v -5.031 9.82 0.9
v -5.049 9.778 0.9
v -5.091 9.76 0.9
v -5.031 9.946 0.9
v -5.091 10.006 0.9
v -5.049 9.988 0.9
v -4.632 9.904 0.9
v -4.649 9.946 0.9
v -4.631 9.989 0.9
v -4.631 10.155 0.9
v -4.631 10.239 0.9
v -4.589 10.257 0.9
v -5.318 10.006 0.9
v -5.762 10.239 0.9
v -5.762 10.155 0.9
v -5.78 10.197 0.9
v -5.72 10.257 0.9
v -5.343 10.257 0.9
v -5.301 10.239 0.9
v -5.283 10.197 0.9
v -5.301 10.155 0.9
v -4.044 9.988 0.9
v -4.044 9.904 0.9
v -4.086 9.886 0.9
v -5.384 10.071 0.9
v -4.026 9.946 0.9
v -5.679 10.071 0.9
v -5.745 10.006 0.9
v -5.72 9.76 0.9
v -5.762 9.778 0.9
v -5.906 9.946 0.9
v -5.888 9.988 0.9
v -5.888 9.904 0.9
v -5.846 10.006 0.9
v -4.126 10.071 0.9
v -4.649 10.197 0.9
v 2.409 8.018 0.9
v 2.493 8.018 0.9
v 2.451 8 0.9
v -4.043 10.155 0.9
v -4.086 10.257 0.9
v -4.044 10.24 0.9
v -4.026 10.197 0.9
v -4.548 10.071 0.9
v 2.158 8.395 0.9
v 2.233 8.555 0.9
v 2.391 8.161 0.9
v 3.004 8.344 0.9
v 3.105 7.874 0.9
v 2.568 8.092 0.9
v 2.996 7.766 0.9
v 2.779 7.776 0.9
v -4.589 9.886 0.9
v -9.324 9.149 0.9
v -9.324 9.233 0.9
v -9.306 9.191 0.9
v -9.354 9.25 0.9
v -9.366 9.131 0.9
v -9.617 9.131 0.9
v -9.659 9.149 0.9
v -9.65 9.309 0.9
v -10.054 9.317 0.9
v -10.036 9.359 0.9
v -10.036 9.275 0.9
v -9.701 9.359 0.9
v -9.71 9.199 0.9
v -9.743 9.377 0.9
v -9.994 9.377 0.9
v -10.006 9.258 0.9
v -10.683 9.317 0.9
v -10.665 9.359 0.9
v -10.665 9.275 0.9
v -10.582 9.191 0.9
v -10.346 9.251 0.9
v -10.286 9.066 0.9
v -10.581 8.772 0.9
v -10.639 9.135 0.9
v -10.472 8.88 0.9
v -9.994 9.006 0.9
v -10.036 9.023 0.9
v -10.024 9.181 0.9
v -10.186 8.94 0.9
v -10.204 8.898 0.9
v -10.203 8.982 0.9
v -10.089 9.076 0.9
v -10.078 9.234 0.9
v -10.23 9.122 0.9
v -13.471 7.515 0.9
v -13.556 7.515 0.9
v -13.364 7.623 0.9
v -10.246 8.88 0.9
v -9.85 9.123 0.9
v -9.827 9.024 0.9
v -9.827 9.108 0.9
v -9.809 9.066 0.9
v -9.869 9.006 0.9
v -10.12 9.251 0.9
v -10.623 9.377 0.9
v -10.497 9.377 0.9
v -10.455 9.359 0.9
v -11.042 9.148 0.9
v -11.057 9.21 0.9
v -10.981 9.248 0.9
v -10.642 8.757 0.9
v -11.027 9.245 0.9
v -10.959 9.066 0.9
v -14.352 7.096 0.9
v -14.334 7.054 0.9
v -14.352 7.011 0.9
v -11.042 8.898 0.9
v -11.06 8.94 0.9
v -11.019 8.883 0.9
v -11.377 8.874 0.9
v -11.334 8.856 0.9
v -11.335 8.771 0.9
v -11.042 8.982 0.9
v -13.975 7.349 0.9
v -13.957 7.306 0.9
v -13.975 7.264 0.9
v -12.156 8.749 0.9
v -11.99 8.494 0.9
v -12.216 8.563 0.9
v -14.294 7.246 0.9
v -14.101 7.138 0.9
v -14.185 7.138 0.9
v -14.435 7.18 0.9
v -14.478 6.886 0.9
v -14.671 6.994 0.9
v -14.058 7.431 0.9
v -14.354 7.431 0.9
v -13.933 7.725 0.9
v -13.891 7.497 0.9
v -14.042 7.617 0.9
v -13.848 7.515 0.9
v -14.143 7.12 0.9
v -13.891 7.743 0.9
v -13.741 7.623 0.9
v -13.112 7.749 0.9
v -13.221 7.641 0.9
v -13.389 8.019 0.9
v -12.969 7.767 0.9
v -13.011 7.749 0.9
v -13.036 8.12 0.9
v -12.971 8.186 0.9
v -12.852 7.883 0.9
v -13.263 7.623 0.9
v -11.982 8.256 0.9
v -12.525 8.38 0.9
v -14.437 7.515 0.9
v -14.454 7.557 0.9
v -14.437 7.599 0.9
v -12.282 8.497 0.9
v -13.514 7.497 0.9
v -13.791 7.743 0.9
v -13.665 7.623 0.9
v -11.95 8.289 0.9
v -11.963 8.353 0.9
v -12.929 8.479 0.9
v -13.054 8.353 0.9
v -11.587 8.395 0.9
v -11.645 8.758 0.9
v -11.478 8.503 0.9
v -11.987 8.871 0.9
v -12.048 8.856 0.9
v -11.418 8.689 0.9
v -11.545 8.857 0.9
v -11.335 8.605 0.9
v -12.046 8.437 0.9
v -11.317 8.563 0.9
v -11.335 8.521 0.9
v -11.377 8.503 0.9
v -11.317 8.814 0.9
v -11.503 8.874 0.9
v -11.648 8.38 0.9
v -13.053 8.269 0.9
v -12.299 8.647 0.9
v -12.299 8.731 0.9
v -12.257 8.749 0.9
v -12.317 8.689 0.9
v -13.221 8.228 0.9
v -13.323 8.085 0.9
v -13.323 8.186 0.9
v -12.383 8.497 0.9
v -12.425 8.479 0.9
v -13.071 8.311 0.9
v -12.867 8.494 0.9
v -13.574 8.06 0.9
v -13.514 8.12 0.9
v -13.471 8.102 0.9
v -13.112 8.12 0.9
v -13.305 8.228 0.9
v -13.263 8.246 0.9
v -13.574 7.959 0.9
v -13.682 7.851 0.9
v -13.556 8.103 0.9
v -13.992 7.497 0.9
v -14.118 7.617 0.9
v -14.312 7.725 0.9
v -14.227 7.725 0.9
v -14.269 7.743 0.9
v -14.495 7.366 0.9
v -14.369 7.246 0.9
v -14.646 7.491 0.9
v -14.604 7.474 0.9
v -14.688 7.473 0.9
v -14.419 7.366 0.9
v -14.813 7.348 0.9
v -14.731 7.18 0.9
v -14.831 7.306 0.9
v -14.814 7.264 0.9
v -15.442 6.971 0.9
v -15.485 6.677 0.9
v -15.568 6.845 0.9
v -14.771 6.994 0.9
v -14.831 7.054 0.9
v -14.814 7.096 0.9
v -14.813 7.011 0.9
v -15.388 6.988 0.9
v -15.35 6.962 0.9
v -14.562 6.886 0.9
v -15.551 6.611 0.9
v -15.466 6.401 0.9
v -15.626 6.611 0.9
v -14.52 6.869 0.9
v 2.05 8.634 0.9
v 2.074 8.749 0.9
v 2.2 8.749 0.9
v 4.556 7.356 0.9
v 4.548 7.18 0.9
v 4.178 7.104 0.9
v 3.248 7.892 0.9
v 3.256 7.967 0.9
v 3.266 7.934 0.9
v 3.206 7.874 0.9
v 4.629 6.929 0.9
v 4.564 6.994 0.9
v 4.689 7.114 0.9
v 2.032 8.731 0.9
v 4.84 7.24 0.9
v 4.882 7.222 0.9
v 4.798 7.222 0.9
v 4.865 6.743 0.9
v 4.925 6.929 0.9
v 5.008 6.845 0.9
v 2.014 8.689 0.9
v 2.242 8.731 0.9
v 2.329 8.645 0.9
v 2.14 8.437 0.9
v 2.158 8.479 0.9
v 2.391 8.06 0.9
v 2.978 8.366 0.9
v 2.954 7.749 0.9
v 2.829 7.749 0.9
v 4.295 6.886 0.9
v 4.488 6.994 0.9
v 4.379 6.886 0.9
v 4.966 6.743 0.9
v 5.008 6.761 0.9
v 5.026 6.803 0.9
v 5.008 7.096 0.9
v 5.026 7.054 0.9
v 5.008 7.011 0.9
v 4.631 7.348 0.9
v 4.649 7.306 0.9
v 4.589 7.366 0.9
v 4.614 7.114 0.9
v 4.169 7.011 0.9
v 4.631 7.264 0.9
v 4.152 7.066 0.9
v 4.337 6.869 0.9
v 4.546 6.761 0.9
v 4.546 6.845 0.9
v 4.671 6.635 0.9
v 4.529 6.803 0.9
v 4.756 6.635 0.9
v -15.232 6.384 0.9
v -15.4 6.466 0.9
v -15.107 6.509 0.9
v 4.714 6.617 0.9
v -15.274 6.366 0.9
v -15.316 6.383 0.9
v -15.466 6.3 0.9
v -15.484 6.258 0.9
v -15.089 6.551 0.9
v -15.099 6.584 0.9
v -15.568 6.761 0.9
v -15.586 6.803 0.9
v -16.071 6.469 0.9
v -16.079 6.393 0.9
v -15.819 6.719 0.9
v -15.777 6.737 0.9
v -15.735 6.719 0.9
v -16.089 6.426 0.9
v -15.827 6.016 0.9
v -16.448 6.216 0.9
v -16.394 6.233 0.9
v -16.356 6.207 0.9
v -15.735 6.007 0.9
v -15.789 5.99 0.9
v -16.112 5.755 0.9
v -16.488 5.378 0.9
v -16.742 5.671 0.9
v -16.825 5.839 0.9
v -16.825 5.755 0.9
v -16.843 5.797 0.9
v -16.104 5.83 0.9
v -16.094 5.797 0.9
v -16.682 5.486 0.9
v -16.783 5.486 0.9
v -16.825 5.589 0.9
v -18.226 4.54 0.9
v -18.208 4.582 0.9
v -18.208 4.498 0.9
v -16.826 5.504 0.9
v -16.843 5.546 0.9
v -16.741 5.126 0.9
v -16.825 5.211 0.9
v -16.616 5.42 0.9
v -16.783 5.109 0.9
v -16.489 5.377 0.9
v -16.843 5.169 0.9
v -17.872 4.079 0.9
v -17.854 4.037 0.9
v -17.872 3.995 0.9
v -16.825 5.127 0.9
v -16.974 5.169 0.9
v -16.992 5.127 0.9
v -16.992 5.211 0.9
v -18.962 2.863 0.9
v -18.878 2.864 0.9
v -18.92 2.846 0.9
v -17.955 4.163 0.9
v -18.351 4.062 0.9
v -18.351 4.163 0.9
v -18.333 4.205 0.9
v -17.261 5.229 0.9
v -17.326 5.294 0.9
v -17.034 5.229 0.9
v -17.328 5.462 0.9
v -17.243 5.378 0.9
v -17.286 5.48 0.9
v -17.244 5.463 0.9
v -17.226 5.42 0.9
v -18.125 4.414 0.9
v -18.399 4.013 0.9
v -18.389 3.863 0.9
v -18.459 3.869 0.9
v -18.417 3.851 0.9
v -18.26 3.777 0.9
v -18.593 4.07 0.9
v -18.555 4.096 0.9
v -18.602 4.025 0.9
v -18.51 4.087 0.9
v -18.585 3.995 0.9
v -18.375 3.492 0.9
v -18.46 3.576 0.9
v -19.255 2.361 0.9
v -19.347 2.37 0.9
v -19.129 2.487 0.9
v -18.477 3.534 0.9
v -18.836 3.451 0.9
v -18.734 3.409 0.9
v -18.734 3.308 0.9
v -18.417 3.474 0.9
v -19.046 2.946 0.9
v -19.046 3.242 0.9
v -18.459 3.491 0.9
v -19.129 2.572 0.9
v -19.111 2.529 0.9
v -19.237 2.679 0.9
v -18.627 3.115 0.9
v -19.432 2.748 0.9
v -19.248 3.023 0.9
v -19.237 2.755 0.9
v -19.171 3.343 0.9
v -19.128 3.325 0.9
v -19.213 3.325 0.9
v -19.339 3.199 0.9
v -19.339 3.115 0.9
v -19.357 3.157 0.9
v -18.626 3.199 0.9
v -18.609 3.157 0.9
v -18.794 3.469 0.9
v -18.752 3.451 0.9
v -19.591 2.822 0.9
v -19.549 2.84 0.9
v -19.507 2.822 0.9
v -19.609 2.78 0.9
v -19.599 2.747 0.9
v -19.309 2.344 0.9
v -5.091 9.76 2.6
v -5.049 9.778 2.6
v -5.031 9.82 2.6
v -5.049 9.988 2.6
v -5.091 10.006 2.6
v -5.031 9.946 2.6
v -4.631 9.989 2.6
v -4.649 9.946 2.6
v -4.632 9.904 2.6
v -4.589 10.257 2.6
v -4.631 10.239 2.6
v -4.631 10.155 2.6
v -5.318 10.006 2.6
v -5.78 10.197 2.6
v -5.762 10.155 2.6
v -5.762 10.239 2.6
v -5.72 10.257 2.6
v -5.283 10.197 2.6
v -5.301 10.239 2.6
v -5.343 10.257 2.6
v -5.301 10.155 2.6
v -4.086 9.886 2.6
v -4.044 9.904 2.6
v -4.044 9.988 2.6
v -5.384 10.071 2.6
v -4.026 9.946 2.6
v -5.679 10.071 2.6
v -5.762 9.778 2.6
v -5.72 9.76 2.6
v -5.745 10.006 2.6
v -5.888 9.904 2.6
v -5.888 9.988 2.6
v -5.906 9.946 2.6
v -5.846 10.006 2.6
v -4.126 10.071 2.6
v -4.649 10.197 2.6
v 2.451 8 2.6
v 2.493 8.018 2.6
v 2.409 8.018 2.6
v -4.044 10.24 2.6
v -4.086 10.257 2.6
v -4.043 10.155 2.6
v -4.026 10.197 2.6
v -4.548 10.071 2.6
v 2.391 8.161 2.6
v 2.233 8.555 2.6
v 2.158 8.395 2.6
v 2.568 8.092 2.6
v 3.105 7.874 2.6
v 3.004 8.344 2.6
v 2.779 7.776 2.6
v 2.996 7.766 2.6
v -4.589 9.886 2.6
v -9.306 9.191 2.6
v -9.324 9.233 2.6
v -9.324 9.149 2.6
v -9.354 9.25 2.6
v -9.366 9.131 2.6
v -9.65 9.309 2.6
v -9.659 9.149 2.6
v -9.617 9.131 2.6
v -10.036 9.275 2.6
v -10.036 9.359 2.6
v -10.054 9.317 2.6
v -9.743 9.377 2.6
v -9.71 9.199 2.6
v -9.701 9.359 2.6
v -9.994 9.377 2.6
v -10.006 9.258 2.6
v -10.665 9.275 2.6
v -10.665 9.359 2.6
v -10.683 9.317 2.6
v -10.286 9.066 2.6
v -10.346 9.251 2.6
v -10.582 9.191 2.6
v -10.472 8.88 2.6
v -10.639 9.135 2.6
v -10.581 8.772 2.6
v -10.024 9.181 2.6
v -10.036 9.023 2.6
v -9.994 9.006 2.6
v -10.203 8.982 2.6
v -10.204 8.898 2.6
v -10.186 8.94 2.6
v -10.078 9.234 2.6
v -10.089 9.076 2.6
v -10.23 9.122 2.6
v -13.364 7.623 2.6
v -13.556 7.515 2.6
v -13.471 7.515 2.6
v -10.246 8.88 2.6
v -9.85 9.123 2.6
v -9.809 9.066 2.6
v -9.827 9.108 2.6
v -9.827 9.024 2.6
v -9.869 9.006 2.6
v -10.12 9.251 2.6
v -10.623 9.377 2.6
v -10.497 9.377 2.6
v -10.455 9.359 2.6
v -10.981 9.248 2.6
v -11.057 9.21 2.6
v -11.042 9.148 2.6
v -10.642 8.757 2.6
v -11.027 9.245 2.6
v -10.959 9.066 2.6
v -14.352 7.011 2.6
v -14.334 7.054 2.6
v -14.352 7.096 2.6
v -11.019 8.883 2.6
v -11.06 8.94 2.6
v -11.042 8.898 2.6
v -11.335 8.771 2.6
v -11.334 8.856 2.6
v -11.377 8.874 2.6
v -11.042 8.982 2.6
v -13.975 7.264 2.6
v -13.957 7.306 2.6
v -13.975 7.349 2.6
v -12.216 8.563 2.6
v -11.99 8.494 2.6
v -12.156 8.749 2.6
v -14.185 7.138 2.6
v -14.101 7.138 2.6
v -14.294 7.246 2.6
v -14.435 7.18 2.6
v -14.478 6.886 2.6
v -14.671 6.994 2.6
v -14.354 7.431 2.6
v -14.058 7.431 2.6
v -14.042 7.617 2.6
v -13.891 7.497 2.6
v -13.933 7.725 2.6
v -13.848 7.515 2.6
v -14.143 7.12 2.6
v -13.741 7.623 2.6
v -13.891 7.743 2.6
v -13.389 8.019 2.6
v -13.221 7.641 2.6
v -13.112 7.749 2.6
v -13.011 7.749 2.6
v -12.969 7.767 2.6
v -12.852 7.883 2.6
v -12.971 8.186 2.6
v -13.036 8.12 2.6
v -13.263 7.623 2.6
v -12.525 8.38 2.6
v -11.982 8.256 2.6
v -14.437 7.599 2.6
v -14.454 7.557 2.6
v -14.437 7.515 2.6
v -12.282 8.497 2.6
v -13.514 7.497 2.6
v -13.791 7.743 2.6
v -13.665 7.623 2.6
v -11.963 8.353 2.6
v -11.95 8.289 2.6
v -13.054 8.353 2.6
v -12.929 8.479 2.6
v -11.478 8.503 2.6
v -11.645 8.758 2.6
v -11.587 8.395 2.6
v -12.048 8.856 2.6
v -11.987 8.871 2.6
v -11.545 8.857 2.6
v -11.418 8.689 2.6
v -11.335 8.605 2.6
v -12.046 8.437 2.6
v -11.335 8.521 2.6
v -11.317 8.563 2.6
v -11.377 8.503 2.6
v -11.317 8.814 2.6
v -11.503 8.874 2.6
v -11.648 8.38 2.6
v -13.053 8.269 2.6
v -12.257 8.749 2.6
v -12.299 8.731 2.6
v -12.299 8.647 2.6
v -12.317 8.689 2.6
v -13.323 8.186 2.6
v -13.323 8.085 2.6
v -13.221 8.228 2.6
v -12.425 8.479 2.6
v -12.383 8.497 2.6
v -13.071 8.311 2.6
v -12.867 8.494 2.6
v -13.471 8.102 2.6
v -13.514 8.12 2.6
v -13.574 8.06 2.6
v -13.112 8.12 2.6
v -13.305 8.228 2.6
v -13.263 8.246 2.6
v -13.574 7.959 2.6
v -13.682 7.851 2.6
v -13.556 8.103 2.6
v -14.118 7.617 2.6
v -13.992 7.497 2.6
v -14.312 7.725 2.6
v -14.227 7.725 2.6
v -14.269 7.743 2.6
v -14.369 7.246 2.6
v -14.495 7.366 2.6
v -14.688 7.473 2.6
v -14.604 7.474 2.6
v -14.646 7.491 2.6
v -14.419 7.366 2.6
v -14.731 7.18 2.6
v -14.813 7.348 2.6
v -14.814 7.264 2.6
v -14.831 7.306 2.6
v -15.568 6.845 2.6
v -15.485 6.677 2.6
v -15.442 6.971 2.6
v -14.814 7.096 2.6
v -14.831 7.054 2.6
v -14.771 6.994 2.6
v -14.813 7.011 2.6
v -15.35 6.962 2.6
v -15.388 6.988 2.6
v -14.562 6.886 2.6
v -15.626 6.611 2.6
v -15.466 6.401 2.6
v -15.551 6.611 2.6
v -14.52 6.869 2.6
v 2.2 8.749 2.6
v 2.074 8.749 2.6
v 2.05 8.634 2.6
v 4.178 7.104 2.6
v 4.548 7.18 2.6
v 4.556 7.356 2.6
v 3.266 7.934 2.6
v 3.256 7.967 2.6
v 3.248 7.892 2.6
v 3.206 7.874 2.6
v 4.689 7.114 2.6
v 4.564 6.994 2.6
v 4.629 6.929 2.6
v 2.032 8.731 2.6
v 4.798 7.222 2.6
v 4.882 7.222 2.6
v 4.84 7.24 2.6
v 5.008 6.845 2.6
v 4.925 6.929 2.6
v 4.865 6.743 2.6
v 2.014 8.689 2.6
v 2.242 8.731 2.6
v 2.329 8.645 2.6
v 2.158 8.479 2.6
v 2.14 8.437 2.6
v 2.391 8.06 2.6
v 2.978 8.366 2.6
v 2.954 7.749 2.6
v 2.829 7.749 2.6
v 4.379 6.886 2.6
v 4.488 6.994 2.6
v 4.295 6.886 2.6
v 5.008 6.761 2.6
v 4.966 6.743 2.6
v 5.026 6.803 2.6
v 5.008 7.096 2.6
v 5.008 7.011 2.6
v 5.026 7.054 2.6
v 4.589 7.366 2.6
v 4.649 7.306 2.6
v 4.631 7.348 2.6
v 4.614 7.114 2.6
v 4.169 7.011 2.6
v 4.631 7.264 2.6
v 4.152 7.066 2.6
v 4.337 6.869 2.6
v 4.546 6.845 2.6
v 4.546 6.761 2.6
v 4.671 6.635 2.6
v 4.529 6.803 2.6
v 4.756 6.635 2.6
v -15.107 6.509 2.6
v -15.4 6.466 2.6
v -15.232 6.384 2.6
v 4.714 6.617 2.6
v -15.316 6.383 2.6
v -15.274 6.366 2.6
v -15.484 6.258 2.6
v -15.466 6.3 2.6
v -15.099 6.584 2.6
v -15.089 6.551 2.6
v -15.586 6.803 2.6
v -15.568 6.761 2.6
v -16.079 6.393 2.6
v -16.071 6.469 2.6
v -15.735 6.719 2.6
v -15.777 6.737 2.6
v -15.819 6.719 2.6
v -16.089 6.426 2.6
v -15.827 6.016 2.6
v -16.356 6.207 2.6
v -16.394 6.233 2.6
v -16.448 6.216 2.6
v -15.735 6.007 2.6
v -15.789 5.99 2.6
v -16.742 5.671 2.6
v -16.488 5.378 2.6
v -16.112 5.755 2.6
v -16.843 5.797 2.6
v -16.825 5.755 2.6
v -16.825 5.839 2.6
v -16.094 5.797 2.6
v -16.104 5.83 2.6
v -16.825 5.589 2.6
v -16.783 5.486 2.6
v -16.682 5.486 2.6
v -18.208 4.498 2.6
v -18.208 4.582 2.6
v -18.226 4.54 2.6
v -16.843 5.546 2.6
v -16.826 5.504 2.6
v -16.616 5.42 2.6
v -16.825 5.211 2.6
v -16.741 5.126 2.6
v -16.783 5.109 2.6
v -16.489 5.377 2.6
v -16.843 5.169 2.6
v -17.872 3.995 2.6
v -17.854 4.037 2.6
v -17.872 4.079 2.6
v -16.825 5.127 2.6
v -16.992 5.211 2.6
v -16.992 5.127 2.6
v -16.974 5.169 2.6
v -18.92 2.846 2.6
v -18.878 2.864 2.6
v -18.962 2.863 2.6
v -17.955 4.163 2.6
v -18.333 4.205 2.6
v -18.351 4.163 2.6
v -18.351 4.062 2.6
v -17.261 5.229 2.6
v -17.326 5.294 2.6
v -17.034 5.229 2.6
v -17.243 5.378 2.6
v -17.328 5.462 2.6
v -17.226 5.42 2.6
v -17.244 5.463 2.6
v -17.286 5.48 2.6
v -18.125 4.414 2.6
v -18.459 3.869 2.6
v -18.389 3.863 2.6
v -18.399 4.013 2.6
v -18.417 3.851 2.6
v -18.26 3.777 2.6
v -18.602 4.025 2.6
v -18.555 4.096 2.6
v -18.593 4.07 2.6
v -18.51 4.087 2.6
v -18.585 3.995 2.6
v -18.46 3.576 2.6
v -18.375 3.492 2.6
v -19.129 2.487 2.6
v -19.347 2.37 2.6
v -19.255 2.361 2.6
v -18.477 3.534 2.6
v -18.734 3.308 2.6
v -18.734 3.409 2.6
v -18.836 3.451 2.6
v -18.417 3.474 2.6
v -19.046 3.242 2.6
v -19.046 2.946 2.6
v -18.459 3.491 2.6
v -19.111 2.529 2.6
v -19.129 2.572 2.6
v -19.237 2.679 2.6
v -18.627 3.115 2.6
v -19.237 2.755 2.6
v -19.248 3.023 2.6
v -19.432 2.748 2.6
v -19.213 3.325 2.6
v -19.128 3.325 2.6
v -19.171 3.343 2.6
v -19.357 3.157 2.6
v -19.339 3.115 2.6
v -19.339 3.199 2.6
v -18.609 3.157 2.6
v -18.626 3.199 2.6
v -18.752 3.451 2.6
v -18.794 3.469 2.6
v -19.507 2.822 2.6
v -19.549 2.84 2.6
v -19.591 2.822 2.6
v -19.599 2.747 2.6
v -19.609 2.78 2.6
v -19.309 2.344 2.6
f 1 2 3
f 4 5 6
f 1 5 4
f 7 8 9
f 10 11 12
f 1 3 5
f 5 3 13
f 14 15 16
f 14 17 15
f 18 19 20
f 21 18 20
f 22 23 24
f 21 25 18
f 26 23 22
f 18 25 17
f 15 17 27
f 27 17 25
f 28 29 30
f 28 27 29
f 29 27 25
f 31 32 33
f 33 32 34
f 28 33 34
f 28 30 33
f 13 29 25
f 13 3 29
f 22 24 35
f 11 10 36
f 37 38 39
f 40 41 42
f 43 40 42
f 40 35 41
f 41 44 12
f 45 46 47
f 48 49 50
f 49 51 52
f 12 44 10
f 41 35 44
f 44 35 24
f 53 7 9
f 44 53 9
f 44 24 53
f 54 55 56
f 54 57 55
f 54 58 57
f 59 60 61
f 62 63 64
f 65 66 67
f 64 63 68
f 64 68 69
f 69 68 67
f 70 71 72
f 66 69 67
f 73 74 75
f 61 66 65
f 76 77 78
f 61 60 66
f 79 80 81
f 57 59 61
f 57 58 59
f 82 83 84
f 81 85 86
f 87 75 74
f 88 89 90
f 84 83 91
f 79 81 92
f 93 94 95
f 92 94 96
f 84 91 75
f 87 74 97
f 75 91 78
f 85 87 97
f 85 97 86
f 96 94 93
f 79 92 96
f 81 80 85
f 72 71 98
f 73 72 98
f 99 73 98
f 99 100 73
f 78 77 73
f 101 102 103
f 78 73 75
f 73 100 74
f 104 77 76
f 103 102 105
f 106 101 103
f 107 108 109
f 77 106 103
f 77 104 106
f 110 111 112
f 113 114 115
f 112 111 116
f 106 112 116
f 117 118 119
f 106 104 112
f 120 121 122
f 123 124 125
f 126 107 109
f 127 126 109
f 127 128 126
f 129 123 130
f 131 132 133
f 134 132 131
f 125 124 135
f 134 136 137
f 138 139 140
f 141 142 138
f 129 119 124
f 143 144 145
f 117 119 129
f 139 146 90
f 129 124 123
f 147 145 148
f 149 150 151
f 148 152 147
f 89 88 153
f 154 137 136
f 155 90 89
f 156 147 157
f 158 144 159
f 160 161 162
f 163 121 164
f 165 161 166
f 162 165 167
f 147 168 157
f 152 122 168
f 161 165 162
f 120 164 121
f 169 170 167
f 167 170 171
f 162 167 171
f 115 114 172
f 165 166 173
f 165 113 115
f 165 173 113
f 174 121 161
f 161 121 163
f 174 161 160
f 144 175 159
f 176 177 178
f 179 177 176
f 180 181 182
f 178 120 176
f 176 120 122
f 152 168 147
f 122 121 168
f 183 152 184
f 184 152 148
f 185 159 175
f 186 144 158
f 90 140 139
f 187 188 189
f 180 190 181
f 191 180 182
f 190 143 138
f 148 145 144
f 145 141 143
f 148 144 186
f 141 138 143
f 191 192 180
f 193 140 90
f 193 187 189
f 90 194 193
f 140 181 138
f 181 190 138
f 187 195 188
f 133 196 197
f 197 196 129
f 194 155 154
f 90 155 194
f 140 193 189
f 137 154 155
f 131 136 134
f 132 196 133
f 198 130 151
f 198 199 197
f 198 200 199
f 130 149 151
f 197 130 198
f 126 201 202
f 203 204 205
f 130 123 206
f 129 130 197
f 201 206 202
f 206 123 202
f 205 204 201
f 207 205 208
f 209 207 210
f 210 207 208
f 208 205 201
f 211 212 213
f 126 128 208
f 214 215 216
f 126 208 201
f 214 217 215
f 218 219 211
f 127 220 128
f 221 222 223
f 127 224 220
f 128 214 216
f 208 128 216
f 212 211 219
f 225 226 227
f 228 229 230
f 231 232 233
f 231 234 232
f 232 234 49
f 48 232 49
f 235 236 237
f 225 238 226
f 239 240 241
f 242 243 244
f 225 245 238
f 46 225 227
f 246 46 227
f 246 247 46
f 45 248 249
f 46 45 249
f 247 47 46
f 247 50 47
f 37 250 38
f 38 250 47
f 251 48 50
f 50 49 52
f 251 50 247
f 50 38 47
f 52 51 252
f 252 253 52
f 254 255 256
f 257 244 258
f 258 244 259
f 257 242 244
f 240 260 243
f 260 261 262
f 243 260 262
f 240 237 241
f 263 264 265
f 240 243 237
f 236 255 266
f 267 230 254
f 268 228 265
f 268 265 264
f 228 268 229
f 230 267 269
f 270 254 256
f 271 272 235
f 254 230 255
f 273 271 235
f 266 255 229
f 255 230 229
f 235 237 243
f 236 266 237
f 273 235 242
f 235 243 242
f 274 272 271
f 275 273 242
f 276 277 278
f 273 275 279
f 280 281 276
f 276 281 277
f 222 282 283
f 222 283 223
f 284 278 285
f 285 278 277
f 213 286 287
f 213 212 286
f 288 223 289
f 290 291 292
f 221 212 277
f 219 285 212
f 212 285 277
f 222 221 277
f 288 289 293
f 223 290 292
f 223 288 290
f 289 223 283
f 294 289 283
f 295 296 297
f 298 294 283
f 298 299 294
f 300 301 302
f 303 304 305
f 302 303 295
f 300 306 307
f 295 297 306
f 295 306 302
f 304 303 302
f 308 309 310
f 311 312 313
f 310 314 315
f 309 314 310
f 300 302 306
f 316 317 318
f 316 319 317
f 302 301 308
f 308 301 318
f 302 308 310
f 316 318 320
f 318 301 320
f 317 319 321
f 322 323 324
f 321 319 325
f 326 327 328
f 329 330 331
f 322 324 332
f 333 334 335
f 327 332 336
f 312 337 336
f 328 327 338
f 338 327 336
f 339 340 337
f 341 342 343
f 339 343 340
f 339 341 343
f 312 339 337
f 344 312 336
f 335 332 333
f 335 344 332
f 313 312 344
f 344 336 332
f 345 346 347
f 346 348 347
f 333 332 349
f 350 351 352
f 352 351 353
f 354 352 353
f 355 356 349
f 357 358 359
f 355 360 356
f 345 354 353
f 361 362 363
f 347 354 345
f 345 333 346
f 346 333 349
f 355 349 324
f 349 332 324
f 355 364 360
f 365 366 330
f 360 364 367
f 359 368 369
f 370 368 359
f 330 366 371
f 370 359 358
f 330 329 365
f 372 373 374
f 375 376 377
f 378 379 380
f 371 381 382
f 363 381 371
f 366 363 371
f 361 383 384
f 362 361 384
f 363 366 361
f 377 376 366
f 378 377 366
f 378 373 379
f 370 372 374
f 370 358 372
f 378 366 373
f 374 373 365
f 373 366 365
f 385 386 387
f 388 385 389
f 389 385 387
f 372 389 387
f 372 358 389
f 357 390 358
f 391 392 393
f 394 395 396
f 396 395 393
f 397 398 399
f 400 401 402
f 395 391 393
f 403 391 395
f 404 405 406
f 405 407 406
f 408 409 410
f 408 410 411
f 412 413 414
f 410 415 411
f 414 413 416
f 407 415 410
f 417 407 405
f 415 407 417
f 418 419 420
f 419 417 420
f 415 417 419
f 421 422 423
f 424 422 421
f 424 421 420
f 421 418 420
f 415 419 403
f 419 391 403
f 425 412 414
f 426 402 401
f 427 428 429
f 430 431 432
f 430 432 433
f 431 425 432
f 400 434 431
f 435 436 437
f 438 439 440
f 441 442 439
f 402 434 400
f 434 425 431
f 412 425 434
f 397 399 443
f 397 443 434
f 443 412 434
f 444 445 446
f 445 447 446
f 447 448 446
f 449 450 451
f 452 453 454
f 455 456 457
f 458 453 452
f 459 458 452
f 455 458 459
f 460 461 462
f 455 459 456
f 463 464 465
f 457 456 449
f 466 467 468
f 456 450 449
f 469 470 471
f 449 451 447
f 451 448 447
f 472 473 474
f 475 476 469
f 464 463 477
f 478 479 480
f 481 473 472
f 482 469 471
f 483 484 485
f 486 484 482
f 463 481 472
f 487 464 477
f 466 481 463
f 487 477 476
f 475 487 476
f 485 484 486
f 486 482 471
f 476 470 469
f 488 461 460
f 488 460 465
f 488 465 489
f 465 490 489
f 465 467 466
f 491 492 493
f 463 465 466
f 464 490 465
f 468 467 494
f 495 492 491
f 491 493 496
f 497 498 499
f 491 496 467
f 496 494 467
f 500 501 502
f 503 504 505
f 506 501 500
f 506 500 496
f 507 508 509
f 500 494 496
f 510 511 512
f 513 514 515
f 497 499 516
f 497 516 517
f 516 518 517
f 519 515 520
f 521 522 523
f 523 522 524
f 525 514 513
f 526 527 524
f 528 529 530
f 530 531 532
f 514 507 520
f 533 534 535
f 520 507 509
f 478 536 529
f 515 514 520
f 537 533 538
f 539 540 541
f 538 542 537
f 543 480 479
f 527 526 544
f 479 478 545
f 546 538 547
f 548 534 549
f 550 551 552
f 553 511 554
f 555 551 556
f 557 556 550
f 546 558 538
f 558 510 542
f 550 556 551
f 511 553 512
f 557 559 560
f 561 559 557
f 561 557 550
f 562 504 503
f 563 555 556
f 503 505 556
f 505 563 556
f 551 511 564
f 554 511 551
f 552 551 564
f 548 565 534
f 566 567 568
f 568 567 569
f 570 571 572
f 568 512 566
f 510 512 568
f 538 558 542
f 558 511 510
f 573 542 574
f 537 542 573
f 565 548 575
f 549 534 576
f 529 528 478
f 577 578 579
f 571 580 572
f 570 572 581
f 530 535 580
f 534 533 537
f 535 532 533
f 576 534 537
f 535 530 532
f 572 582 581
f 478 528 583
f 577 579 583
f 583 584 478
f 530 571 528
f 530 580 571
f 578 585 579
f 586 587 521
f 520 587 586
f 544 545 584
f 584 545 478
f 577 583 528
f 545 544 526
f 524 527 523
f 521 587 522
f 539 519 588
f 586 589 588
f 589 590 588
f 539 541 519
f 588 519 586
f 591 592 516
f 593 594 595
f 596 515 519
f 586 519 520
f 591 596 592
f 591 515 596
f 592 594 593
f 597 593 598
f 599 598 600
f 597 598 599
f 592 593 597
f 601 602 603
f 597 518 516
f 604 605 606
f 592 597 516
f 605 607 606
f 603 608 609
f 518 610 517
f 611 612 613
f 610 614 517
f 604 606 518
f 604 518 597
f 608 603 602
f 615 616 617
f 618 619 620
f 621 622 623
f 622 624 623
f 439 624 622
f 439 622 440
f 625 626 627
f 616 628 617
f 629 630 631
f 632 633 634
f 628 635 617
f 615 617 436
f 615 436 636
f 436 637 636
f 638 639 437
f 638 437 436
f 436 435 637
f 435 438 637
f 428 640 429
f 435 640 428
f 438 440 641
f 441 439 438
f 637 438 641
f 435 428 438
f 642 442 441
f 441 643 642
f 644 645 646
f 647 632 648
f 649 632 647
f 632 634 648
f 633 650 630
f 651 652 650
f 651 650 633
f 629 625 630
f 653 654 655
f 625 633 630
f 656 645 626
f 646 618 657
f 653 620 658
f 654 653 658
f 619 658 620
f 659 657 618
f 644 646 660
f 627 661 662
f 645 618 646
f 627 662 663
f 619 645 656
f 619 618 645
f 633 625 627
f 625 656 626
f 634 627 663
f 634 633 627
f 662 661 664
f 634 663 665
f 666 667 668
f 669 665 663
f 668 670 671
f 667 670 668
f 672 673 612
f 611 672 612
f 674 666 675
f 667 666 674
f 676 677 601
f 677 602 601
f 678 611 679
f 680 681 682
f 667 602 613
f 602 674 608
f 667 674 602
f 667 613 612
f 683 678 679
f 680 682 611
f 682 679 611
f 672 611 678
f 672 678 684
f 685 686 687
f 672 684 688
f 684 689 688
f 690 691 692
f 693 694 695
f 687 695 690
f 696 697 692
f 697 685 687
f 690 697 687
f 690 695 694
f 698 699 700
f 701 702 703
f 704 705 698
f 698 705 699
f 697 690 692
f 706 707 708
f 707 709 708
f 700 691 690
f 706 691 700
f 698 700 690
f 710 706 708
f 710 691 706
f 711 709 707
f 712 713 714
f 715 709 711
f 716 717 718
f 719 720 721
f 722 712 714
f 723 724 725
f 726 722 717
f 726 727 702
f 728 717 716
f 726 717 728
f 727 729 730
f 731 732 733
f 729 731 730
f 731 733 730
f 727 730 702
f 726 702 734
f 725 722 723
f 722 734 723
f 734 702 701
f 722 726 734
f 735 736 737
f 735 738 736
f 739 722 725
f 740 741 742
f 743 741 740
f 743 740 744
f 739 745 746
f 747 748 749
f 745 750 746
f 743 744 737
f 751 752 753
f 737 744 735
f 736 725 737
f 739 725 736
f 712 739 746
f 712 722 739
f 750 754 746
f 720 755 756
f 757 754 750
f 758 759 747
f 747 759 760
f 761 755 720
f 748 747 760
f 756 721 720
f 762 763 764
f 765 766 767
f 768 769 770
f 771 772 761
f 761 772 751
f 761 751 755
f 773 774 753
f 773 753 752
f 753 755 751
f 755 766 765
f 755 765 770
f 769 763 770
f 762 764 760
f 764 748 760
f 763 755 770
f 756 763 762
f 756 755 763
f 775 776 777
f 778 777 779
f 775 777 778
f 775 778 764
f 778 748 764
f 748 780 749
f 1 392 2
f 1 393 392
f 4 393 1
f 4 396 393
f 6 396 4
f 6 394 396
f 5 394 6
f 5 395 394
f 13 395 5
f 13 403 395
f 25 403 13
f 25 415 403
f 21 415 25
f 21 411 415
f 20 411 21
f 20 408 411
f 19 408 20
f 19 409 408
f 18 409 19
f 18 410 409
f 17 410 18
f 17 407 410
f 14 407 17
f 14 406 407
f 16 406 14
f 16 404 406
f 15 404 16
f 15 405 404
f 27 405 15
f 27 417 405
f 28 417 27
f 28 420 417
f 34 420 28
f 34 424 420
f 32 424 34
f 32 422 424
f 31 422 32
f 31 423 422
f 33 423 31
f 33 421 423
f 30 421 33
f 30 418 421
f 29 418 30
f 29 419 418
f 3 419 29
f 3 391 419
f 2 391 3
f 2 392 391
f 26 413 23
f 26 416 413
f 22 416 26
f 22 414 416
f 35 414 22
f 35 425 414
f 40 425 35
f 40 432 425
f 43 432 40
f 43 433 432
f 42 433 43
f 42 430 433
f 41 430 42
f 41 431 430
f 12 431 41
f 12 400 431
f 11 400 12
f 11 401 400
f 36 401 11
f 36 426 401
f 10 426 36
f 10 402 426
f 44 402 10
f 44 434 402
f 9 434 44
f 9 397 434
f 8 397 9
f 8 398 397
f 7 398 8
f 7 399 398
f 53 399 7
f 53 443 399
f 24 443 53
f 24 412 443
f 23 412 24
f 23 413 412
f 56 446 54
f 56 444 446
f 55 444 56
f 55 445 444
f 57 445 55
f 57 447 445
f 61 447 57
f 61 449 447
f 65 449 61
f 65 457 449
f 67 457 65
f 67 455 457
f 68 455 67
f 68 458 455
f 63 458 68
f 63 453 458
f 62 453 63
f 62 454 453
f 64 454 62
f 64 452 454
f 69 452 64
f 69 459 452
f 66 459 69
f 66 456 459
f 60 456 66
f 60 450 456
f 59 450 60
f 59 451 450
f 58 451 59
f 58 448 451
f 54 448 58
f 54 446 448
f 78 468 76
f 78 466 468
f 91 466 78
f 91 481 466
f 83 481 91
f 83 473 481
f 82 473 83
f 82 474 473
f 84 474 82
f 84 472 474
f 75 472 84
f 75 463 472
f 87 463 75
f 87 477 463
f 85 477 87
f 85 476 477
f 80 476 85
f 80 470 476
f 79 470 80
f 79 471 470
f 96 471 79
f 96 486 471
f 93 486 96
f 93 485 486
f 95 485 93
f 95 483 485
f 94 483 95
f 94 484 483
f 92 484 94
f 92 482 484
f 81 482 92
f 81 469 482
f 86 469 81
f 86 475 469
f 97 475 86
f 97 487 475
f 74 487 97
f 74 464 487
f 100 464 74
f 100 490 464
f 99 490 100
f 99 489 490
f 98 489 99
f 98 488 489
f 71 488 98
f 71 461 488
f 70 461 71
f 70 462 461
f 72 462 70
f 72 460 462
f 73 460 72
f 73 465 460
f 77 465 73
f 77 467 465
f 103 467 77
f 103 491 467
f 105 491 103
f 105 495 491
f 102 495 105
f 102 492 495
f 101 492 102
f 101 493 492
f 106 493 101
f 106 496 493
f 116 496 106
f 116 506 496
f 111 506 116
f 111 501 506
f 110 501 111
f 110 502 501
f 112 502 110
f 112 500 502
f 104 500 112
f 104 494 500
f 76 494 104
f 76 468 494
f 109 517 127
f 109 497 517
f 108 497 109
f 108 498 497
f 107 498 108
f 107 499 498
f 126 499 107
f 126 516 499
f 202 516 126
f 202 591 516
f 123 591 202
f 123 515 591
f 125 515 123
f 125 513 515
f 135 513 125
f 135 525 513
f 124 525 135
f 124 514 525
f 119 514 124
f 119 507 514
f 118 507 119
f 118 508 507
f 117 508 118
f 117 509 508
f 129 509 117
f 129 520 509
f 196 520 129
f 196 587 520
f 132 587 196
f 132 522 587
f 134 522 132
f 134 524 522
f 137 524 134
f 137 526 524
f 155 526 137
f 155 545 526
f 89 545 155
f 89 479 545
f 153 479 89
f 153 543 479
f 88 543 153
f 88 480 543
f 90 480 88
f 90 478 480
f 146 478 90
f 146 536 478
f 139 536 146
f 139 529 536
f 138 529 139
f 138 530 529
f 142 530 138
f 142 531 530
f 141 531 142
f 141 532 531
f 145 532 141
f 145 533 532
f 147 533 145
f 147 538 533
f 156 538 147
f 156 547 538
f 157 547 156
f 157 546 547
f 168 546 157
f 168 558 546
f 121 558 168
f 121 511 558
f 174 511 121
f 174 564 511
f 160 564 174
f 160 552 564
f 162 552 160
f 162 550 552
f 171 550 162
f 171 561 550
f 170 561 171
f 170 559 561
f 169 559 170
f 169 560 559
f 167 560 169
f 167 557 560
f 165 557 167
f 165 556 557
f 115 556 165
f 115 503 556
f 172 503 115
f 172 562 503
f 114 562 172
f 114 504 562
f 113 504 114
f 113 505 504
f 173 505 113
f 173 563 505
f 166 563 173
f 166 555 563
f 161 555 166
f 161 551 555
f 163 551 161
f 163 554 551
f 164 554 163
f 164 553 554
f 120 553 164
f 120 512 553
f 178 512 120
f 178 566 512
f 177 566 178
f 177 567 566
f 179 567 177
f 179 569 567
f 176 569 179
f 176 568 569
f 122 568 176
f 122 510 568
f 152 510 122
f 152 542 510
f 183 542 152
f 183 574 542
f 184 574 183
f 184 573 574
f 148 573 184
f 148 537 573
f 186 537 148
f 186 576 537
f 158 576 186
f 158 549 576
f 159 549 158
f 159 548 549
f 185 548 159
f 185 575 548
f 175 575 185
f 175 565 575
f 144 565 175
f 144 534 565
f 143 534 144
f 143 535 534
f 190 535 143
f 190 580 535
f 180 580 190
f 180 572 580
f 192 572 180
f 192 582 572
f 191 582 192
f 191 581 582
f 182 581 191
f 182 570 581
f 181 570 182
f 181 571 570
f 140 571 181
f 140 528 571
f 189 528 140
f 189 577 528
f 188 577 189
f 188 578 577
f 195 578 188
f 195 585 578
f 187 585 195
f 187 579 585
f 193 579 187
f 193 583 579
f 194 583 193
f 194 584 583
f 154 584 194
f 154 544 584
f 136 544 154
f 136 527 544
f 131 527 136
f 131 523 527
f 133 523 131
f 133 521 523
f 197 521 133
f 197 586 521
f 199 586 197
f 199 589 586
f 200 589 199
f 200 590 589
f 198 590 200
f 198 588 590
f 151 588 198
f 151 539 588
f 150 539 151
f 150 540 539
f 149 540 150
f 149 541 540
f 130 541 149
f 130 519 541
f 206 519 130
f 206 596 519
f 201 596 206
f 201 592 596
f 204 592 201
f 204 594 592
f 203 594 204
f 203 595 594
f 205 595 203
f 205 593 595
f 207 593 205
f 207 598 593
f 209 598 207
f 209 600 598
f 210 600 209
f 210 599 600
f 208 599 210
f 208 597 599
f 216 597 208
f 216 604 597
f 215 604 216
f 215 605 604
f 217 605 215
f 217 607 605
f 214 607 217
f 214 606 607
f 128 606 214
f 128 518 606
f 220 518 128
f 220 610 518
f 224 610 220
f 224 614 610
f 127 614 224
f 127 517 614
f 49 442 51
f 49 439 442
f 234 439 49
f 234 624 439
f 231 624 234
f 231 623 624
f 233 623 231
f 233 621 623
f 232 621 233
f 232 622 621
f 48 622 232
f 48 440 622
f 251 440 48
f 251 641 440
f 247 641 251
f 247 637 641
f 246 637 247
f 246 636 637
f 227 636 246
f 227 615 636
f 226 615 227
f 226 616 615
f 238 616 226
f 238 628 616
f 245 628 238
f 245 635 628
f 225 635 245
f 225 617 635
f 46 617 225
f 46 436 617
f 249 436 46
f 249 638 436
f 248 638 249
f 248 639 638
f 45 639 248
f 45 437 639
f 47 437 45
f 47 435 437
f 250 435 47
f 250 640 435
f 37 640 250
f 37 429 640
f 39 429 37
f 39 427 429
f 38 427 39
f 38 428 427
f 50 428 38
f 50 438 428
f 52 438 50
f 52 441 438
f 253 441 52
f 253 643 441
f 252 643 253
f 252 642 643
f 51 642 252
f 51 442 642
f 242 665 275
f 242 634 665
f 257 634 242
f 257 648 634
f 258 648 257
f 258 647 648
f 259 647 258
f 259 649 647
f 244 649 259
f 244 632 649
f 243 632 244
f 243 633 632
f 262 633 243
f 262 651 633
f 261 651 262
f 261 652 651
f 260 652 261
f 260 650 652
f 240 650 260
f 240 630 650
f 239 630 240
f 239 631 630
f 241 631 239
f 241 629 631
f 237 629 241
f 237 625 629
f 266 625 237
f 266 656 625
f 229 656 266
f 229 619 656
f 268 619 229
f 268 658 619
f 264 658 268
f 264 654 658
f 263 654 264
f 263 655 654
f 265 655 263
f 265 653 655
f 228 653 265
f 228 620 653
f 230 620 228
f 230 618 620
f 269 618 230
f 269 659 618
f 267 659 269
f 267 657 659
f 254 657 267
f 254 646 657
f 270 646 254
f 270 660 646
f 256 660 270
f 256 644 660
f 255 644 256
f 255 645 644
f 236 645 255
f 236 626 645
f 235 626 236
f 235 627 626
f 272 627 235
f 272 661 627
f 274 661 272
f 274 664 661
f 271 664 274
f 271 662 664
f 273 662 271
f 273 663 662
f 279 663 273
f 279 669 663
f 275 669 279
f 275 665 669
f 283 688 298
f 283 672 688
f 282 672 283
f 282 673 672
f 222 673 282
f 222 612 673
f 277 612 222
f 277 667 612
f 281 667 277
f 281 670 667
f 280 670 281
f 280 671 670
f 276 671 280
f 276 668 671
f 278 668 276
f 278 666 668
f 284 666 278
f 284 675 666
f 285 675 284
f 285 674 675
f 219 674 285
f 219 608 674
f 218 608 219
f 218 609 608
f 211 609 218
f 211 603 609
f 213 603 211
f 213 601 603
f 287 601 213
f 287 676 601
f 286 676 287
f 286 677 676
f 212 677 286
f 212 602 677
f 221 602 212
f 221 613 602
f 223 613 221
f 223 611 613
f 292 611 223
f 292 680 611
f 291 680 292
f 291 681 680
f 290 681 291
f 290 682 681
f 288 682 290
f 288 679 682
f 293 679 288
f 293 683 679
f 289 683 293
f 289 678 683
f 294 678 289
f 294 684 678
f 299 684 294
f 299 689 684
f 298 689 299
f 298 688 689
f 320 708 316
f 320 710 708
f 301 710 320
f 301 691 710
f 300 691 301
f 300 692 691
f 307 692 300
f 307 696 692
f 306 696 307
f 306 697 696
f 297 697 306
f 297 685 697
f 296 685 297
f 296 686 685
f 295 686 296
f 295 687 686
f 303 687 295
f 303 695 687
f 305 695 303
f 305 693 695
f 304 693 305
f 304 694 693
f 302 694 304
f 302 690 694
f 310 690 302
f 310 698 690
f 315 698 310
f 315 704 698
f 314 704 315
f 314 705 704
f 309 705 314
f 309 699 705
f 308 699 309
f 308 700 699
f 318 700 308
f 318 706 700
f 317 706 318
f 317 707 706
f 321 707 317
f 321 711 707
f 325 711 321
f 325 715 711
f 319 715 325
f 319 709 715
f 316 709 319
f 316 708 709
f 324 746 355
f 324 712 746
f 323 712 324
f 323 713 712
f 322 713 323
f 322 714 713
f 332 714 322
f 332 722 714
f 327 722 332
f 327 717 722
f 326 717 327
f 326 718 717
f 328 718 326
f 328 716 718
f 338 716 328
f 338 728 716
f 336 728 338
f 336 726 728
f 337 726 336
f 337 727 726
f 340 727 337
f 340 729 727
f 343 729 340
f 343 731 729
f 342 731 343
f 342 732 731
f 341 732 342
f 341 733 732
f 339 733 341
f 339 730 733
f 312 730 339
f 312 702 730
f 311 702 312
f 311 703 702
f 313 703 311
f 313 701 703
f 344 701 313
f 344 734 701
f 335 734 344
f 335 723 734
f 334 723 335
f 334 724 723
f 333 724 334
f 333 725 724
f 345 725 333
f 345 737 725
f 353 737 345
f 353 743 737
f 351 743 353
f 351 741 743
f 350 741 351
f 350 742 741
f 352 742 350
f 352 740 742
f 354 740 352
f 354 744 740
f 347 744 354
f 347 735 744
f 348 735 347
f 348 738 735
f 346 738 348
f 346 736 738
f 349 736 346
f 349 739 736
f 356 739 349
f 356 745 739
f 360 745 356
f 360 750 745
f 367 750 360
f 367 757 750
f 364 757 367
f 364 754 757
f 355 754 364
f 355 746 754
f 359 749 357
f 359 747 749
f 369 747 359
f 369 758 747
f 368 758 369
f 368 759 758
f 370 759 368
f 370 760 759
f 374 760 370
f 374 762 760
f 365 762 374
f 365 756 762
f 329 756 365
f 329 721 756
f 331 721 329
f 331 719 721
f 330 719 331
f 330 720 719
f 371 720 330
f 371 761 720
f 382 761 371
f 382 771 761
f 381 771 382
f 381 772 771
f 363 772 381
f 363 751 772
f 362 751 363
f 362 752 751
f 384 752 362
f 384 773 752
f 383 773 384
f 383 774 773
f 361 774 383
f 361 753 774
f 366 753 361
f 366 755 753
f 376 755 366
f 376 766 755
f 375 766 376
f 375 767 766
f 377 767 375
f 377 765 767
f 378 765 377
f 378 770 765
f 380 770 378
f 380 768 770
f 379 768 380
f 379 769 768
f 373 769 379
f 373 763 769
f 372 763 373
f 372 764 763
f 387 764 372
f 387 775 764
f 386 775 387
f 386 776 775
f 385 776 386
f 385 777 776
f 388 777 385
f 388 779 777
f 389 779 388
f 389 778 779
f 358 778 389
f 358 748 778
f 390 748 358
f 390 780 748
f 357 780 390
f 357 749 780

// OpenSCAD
$fn = 24;
translate([0, -2.500, 0.900])
  linear_extrude(height=1.700) {
offset(r=0.06, $fn=8) {
    polygon(points=[[-18.794,5.909],[-19.046,5.657],[-19.171,5.783],[-19.297,5.657],[-19.171,5.531],[-19.423,5.154],[-19.549,5.280],[-19.674,5.154],[-19.549,5.280],[-19.297,4.903],[-19.171,5.029],[-19.297,5.154],[-19.297,5.280],[-19.046,5.531],[-18.920,5.406],[-18.669,5.657],[-18.794,5.783]], paths=[[0,1,2,3,4,5,6,7,8,9,10,11,12,13,14,15,16]]);
    polygon(points=[[-17.034,7.669],[-17.286,7.669],[-17.411,7.794],[-17.286,7.920],[-18.166,7.040],[-18.040,6.914],[-18.291,6.663],[-18.291,6.537],[-18.417,6.411],[-18.543,6.537],[-18.920,6.160],[-18.543,6.537],[-18.166,6.286],[-18.417,6.034],[-17.914,6.537],[-18.040,6.663]], paths=[[0,1,2,3,4,5,6,7,8,9,10,11,12,13,14,15]]);
    polygon(points=[[-16.406,8.674],[-16.783,8.297],[-16.657,8.171],[-16.783,8.046],[-16.657,8.046],[-16.531,7.920],[-16.783,7.669],[-16.154,8.297]], paths=[[0,1,2,3,4,5,6,7]]);
    polygon(points=[[-15.400,9.429],[-15.526,9.303],[-15.400,9.177],[-15.526,9.051],[-15.651,9.051],[-15.777,9.177],[-16.029,8.926],[-15.777,8.549],[-15.903,8.423],[-15.526,8.800],[-15.526,8.926],[-15.400,9.051],[-15.274,8.926],[-15.149,9.051]], paths=[[0,1,2,3,4,5,6,7,8,9,10,11,12,13]]);
    polygon(points=[[4.463,9.931],[4.589,9.806],[4.211,9.554],[4.337,9.429],[4.463,9.554],[4.589,9.554],[4.714,9.429],[4.589,9.303],[4.714,9.177],[4.840,9.303],[4.966,9.303],[4.840,9.429],[4.966,9.554],[4.840,9.680],[4.714,9.554],[4.589,9.554],[4.463,9.680],[4.589,9.806]], paths=[[0,1,2,3,4,5,6,7,8,9,10,11,12,13,14,15,16,17]]);
    polygon(points=[[2.074,11.189],[2.200,11.189],[2.326,11.063],[2.200,10.937],[2.074,10.937],[2.200,10.937],[2.326,10.811],[2.200,10.686],[2.074,10.686],[2.200,10.686],[2.326,10.811],[2.451,10.686],[2.451,10.560],[2.577,10.686],[2.829,10.309],[2.954,10.309],[3.080,10.183],[2.954,10.309],[3.080,10.434],[3.206,10.434],[3.331,10.309],[3.206,10.434],[3.331,10.560],[3.206,10.434],[2.954,10.811]], paths=[[0,1,2,3,4,5,6,7,8,9,10,11,12,13,14,15,16,17,18,19,20,21,22,23,24]]);
    polygon(points=[[-11.377,11.314],[-11.503,11.314],[-11.629,11.440],[-11.503,11.314],[-11.629,11.189],[-12.006,11.314],[-12.131,11.189],[-12.257,11.189],[-12.131,11.063],[-12.257,10.937],[-12.383,10.937],[-12.509,11.063],[-12.383,10.937],[-12.509,10.811],[-12.886,10.937],[-13.011,10.811],[-12.886,10.686],[-13.011,10.560],[-13.137,10.560],[-13.263,10.686],[-13.263,10.560],[-13.389,10.434],[-13.514,10.560],[-13.514,10.434],[-13.640,10.309],[-13.766,10.434],[-13.640,10.309],[-13.766,10.183],[-13.891,10.183],[-14.017,10.309],[-13.891,10.183],[-14.017,10.057],[-14.143,10.057],[-14.269,10.183],[-14.394,10.057],[-14.269,9.931],[-14.394,9.806],[-14.520,9.806],[-14.646,9.931],[-14.771,9.806],[-14.646,9.680],[-14.771,9.554],[-14.646,9.554],[-14.520,9.429],[-14.394,9.554],[-14.520,9.680],[-14.394,9.806],[-14.269,9.806],[-14.143,9.680],[-14.017,9.806],[-14.143,9.931],[-14.017,10.057],[-13.891,10.057],[-13.766,9.931],[-13.891,10.057],[-13.766,10.183],[-13.640,10.183],[-13.514,10.057],[-13.389,10.183],[-13.263,10.183],[-13.137,10.309],[-13.011,10.309],[-12.886,10.434],[-12.006,10.811],[-12.131,10.937],[-12.006,11.063],[-11.629,10.937],[-11.503,11.063],[-11.377,11.063],[-11.503,11.189]], paths=[[0,1,2,3,4,5,6,7,8,9,10,11,12,13,14,15,16,17,18,19,20,21,22,23,24,25,26,27,28,29,30,31,32,33,34,35,36,37,38,39,40,41,42,43,44,45,46,47,48,49,50,51,52,53,54,55,56,57,58,59,60,61,62,63,64,65,66,67,68,69]]);
    polygon(points=[[-9.366,11.691],[-9.617,11.691],[-9.743,11.817],[-9.994,11.817],[-10.120,11.943],[-10.246,11.943],[-10.120,11.943],[-9.994,11.817],[-10.120,11.691],[-10.371,11.691],[-10.497,11.817],[-10.623,11.817],[-10.497,11.691],[-10.623,11.566],[-11.000,11.691],[-10.874,11.566],[-11.000,11.440],[-11.377,11.566],[-10.623,11.314],[-10.497,11.440],[-10.246,11.440],[-10.371,11.566],[-10.246,11.691],[-9.869,11.566],[-9.994,11.566],[-10.120,11.691],[-9.994,11.817]], paths=[[0,1,2,3,4,5,6,7,8,9,10,11,12,13,14,15,16,17,18,19,20,21,22,23,24,25,26]]);
    polygon(points=[[-6.726,12.446],[-5.846,12.446],[-5.720,12.320],[-5.091,12.320],[-5.091,12.446],[-5.343,12.446],[-5.469,12.571],[-5.343,12.697],[-4.589,12.697],[-4.463,12.571],[-4.589,12.446],[-3.457,12.446],[-4.086,12.446],[-4.211,12.571],[-4.086,12.697],[-3.583,12.697],[-6.223,12.697],[-5.720,12.697],[-5.594,12.571],[-5.720,12.446]], paths=[[0,1,2,3,4,5,6,7,8,9,10,11,12,13,14,15,16,17,18,19]]);
}
}
